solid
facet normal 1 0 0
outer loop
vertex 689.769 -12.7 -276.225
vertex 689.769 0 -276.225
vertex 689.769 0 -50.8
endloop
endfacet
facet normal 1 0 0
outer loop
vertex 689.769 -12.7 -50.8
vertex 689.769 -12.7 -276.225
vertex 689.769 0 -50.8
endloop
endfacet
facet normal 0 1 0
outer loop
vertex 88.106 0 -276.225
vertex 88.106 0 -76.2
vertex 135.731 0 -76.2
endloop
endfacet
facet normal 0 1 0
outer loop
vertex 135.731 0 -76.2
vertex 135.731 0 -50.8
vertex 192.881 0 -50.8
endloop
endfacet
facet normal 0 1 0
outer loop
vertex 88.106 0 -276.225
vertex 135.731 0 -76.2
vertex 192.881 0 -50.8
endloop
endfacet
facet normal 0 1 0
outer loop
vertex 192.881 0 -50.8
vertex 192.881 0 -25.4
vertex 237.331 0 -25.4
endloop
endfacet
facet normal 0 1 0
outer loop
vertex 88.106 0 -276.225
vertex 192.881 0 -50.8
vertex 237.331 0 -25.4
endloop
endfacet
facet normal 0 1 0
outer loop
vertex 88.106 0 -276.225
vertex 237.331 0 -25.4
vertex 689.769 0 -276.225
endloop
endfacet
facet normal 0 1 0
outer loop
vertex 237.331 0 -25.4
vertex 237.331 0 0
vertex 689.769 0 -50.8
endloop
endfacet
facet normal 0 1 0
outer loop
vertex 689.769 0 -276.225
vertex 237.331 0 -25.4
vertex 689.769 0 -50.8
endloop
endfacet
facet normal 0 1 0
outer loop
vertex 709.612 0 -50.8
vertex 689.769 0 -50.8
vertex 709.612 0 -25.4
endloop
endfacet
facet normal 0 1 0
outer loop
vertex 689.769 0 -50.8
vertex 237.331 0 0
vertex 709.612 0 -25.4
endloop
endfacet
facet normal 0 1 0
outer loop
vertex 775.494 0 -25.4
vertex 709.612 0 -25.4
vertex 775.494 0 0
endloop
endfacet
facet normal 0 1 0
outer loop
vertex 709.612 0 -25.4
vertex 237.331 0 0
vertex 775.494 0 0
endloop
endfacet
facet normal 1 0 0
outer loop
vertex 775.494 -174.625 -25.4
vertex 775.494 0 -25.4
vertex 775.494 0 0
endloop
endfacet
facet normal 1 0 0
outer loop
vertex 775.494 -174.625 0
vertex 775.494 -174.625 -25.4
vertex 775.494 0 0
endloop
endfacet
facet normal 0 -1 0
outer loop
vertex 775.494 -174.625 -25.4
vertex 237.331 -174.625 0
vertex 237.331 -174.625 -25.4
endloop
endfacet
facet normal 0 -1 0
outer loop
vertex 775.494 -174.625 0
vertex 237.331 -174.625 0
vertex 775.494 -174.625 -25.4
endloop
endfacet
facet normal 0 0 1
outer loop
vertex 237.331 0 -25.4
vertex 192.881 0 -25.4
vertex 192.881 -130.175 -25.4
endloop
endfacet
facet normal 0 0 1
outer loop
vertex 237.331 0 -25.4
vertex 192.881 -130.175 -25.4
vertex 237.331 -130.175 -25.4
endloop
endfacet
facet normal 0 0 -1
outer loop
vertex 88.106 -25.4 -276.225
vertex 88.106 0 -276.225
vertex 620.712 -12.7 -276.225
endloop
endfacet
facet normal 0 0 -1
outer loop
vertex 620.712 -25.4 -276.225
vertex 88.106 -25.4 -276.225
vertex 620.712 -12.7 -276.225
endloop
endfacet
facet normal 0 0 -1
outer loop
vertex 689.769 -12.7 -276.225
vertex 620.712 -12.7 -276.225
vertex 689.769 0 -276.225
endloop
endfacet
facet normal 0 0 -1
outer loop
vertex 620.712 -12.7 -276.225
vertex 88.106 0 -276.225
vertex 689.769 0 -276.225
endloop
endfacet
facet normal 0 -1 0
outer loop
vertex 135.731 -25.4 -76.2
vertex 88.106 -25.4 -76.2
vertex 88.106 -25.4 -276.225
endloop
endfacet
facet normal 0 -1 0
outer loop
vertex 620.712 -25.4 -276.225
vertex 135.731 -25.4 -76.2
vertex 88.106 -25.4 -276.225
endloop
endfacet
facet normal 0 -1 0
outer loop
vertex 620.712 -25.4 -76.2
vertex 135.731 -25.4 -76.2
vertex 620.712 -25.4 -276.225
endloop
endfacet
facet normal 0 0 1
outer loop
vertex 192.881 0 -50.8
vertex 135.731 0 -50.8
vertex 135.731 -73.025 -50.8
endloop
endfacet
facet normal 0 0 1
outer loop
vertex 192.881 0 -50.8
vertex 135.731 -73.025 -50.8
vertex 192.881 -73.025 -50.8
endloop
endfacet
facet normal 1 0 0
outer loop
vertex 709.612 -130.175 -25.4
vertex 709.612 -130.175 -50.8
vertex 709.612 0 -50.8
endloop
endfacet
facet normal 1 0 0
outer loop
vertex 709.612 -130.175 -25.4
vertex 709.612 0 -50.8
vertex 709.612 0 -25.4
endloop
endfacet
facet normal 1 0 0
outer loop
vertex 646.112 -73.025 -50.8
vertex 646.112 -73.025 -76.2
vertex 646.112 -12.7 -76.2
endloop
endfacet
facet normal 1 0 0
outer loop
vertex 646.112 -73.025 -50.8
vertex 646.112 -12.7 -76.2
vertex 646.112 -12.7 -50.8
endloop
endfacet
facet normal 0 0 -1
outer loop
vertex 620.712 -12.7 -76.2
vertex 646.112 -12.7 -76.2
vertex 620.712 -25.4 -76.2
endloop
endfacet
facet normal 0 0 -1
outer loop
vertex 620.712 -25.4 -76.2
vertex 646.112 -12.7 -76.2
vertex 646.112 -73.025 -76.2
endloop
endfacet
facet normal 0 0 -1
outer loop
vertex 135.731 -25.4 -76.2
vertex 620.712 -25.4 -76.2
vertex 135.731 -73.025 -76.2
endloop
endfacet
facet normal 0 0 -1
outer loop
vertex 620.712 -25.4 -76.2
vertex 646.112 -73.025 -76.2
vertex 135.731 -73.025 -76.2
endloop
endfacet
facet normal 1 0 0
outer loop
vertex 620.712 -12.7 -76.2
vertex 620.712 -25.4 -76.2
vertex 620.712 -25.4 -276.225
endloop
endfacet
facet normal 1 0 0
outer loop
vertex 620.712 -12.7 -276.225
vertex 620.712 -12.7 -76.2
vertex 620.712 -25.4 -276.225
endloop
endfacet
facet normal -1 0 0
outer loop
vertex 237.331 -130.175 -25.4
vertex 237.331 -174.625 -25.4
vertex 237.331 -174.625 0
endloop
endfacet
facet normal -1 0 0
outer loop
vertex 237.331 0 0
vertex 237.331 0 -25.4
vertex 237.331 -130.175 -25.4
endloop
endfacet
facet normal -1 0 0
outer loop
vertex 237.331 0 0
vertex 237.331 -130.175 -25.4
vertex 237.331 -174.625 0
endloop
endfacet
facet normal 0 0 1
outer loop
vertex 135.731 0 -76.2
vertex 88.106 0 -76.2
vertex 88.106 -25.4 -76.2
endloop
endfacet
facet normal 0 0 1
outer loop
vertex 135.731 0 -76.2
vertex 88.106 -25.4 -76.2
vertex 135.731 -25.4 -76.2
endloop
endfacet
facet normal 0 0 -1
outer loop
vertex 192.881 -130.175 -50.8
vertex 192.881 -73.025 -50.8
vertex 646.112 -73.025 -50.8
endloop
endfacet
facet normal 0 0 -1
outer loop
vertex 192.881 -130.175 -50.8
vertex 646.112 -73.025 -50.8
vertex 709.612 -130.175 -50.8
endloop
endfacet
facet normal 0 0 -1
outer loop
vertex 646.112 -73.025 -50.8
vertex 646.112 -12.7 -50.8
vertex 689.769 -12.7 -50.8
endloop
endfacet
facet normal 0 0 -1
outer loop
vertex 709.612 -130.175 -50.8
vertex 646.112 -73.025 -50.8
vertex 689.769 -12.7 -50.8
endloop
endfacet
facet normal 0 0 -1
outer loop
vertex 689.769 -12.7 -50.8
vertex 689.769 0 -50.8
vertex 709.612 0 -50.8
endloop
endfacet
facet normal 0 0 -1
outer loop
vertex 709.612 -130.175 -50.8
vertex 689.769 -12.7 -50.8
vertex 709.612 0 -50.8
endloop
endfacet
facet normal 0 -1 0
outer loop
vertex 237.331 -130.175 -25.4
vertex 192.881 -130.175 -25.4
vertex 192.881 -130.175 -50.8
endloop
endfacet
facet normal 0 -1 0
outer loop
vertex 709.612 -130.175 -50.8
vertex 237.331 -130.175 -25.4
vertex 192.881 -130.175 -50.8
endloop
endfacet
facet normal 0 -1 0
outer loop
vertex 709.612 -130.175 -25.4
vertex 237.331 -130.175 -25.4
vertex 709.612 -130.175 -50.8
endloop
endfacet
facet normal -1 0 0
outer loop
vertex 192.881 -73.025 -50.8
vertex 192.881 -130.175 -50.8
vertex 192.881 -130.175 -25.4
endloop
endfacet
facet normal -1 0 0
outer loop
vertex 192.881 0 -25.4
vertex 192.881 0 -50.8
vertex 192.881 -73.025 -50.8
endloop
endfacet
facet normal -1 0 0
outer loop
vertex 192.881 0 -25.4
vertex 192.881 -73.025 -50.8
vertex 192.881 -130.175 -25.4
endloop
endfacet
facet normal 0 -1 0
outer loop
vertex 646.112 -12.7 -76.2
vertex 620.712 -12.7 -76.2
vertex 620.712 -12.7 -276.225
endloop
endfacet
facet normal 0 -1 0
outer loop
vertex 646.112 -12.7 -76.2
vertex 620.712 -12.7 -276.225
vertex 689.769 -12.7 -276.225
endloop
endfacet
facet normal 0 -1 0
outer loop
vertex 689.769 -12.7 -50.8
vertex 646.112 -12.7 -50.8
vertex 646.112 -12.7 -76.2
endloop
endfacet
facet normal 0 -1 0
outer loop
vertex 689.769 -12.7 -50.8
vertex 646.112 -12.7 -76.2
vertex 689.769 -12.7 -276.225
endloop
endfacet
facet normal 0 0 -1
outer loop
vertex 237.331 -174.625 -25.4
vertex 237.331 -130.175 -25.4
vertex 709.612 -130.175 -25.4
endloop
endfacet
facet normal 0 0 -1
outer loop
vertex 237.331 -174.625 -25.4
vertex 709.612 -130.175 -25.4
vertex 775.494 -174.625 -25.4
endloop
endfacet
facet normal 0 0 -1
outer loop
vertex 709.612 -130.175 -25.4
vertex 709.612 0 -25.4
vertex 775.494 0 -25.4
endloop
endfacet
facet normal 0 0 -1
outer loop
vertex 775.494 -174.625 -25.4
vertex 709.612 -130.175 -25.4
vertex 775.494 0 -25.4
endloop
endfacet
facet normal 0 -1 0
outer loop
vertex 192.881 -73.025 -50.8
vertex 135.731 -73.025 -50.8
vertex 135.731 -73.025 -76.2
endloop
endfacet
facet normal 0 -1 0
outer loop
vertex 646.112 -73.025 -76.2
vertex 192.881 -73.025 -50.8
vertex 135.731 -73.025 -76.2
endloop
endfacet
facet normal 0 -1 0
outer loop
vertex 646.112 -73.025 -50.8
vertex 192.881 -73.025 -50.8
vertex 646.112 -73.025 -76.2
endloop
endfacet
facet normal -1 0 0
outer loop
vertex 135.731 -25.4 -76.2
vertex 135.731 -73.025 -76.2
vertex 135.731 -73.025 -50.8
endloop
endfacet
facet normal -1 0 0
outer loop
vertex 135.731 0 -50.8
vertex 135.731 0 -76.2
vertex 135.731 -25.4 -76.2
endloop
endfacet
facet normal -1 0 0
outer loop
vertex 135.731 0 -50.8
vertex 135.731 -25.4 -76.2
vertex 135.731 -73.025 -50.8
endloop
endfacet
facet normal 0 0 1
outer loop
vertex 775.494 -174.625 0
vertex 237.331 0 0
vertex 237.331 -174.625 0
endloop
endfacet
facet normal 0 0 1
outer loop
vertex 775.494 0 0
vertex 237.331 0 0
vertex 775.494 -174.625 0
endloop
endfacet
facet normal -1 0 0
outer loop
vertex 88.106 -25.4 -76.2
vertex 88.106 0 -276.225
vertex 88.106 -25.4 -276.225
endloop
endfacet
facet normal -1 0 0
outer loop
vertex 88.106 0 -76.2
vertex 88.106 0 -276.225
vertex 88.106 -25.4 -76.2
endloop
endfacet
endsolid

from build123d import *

# Parameters (mm, degrees)
F0_W      = 1550.9875
F0_H      = 25.4
F1_DEPTH  = 174.625
F3_W      = 1419.225
F3_H      = 25.4
F4_DEPTH  = 130.175
F5_W      = 1292.225
F5_H      = 25.4
F6_DEPTH  = 73.025
F2_W      = 1363.6625
F2_H      = 250.825
F7_DEPTH  = 25.4
F9_DEPTH  = 12.7
F10_W     = 936.912687
F10_H     = 531.850287
F11_DEPTH = 174.626
F13_DEPTH = 174.626


with BuildPart() as f1:
    # F0 (on Front) → F1 (new body)
    with BuildSketch(Plane.XZ):
        with Locations((0, -12.7)):
            Rectangle(F0_W, F0_H)
    extrude(amount=F1_DEPTH)

    # F3 (on Front) → F4 (join)
    with BuildSketch(Plane.XZ):
        with Locations((0, -38.1)):
            Rectangle(F3_W, F3_H)
    extrude(amount=F4_DEPTH)

    # F5 (on Front) → F6 (join)
    with BuildSketch(Plane.XZ):
        with Locations((0, -63.5)):
            Rectangle(F5_W, F5_H)
    extrude(amount=F6_DEPTH)

    # F2 (on Front) → F7 (join)
    with BuildSketch(Plane.XZ):
        with Locations((7.9375, -150.8125)):
            Rectangle(F2_W, F2_H)
    extrude(amount=F7_DEPTH)

    # F8 (on face) → F9 (cut)
    with BuildSketch(Plane.XZ.offset(25.4)):
        Polygon((-673.89375, -50.8), (-673.89375, -276.225), (-620.7125, -276.225), (-620.7125, -76.2), (-646.1125, -76.2), (-646.1125, -50.8), align=None)
        Polygon((620.7125, -76.2), (620.7125, -276.225), (689.76875, -276.225), (689.76875, -50.8), (646.1125, -50.8), (646.1125, -76.2), align=None)
    extrude(amount=-F9_DEPTH, mode=Mode.SUBTRACT)

    # F10 (on Front) → F11 (cut, through all)
    with BuildSketch(Plane.XZ):
        with Locations((-380.350093, -119.809725)):
            Rectangle(F10_W, F10_H)
    extrude(amount=F11_DEPTH, mode=Mode.SUBTRACT)

    # F12 (on Front) → F13 (cut, through all)
    with BuildSketch(Plane.XZ):
        Polygon((237.33125, -25.4), (237.33125, 0), (148.372248, 68.829454), (-112.537719, 31.016426), (38.714431, -95.657267), (88.10625, -76.2), (135.73125, -76.2), (135.73125, -50.8), (192.88125, -50.8), (192.88125, -25.4), align=None)
    extrude(amount=F13_DEPTH, mode=Mode.SUBTRACT)


solid = f1.part
